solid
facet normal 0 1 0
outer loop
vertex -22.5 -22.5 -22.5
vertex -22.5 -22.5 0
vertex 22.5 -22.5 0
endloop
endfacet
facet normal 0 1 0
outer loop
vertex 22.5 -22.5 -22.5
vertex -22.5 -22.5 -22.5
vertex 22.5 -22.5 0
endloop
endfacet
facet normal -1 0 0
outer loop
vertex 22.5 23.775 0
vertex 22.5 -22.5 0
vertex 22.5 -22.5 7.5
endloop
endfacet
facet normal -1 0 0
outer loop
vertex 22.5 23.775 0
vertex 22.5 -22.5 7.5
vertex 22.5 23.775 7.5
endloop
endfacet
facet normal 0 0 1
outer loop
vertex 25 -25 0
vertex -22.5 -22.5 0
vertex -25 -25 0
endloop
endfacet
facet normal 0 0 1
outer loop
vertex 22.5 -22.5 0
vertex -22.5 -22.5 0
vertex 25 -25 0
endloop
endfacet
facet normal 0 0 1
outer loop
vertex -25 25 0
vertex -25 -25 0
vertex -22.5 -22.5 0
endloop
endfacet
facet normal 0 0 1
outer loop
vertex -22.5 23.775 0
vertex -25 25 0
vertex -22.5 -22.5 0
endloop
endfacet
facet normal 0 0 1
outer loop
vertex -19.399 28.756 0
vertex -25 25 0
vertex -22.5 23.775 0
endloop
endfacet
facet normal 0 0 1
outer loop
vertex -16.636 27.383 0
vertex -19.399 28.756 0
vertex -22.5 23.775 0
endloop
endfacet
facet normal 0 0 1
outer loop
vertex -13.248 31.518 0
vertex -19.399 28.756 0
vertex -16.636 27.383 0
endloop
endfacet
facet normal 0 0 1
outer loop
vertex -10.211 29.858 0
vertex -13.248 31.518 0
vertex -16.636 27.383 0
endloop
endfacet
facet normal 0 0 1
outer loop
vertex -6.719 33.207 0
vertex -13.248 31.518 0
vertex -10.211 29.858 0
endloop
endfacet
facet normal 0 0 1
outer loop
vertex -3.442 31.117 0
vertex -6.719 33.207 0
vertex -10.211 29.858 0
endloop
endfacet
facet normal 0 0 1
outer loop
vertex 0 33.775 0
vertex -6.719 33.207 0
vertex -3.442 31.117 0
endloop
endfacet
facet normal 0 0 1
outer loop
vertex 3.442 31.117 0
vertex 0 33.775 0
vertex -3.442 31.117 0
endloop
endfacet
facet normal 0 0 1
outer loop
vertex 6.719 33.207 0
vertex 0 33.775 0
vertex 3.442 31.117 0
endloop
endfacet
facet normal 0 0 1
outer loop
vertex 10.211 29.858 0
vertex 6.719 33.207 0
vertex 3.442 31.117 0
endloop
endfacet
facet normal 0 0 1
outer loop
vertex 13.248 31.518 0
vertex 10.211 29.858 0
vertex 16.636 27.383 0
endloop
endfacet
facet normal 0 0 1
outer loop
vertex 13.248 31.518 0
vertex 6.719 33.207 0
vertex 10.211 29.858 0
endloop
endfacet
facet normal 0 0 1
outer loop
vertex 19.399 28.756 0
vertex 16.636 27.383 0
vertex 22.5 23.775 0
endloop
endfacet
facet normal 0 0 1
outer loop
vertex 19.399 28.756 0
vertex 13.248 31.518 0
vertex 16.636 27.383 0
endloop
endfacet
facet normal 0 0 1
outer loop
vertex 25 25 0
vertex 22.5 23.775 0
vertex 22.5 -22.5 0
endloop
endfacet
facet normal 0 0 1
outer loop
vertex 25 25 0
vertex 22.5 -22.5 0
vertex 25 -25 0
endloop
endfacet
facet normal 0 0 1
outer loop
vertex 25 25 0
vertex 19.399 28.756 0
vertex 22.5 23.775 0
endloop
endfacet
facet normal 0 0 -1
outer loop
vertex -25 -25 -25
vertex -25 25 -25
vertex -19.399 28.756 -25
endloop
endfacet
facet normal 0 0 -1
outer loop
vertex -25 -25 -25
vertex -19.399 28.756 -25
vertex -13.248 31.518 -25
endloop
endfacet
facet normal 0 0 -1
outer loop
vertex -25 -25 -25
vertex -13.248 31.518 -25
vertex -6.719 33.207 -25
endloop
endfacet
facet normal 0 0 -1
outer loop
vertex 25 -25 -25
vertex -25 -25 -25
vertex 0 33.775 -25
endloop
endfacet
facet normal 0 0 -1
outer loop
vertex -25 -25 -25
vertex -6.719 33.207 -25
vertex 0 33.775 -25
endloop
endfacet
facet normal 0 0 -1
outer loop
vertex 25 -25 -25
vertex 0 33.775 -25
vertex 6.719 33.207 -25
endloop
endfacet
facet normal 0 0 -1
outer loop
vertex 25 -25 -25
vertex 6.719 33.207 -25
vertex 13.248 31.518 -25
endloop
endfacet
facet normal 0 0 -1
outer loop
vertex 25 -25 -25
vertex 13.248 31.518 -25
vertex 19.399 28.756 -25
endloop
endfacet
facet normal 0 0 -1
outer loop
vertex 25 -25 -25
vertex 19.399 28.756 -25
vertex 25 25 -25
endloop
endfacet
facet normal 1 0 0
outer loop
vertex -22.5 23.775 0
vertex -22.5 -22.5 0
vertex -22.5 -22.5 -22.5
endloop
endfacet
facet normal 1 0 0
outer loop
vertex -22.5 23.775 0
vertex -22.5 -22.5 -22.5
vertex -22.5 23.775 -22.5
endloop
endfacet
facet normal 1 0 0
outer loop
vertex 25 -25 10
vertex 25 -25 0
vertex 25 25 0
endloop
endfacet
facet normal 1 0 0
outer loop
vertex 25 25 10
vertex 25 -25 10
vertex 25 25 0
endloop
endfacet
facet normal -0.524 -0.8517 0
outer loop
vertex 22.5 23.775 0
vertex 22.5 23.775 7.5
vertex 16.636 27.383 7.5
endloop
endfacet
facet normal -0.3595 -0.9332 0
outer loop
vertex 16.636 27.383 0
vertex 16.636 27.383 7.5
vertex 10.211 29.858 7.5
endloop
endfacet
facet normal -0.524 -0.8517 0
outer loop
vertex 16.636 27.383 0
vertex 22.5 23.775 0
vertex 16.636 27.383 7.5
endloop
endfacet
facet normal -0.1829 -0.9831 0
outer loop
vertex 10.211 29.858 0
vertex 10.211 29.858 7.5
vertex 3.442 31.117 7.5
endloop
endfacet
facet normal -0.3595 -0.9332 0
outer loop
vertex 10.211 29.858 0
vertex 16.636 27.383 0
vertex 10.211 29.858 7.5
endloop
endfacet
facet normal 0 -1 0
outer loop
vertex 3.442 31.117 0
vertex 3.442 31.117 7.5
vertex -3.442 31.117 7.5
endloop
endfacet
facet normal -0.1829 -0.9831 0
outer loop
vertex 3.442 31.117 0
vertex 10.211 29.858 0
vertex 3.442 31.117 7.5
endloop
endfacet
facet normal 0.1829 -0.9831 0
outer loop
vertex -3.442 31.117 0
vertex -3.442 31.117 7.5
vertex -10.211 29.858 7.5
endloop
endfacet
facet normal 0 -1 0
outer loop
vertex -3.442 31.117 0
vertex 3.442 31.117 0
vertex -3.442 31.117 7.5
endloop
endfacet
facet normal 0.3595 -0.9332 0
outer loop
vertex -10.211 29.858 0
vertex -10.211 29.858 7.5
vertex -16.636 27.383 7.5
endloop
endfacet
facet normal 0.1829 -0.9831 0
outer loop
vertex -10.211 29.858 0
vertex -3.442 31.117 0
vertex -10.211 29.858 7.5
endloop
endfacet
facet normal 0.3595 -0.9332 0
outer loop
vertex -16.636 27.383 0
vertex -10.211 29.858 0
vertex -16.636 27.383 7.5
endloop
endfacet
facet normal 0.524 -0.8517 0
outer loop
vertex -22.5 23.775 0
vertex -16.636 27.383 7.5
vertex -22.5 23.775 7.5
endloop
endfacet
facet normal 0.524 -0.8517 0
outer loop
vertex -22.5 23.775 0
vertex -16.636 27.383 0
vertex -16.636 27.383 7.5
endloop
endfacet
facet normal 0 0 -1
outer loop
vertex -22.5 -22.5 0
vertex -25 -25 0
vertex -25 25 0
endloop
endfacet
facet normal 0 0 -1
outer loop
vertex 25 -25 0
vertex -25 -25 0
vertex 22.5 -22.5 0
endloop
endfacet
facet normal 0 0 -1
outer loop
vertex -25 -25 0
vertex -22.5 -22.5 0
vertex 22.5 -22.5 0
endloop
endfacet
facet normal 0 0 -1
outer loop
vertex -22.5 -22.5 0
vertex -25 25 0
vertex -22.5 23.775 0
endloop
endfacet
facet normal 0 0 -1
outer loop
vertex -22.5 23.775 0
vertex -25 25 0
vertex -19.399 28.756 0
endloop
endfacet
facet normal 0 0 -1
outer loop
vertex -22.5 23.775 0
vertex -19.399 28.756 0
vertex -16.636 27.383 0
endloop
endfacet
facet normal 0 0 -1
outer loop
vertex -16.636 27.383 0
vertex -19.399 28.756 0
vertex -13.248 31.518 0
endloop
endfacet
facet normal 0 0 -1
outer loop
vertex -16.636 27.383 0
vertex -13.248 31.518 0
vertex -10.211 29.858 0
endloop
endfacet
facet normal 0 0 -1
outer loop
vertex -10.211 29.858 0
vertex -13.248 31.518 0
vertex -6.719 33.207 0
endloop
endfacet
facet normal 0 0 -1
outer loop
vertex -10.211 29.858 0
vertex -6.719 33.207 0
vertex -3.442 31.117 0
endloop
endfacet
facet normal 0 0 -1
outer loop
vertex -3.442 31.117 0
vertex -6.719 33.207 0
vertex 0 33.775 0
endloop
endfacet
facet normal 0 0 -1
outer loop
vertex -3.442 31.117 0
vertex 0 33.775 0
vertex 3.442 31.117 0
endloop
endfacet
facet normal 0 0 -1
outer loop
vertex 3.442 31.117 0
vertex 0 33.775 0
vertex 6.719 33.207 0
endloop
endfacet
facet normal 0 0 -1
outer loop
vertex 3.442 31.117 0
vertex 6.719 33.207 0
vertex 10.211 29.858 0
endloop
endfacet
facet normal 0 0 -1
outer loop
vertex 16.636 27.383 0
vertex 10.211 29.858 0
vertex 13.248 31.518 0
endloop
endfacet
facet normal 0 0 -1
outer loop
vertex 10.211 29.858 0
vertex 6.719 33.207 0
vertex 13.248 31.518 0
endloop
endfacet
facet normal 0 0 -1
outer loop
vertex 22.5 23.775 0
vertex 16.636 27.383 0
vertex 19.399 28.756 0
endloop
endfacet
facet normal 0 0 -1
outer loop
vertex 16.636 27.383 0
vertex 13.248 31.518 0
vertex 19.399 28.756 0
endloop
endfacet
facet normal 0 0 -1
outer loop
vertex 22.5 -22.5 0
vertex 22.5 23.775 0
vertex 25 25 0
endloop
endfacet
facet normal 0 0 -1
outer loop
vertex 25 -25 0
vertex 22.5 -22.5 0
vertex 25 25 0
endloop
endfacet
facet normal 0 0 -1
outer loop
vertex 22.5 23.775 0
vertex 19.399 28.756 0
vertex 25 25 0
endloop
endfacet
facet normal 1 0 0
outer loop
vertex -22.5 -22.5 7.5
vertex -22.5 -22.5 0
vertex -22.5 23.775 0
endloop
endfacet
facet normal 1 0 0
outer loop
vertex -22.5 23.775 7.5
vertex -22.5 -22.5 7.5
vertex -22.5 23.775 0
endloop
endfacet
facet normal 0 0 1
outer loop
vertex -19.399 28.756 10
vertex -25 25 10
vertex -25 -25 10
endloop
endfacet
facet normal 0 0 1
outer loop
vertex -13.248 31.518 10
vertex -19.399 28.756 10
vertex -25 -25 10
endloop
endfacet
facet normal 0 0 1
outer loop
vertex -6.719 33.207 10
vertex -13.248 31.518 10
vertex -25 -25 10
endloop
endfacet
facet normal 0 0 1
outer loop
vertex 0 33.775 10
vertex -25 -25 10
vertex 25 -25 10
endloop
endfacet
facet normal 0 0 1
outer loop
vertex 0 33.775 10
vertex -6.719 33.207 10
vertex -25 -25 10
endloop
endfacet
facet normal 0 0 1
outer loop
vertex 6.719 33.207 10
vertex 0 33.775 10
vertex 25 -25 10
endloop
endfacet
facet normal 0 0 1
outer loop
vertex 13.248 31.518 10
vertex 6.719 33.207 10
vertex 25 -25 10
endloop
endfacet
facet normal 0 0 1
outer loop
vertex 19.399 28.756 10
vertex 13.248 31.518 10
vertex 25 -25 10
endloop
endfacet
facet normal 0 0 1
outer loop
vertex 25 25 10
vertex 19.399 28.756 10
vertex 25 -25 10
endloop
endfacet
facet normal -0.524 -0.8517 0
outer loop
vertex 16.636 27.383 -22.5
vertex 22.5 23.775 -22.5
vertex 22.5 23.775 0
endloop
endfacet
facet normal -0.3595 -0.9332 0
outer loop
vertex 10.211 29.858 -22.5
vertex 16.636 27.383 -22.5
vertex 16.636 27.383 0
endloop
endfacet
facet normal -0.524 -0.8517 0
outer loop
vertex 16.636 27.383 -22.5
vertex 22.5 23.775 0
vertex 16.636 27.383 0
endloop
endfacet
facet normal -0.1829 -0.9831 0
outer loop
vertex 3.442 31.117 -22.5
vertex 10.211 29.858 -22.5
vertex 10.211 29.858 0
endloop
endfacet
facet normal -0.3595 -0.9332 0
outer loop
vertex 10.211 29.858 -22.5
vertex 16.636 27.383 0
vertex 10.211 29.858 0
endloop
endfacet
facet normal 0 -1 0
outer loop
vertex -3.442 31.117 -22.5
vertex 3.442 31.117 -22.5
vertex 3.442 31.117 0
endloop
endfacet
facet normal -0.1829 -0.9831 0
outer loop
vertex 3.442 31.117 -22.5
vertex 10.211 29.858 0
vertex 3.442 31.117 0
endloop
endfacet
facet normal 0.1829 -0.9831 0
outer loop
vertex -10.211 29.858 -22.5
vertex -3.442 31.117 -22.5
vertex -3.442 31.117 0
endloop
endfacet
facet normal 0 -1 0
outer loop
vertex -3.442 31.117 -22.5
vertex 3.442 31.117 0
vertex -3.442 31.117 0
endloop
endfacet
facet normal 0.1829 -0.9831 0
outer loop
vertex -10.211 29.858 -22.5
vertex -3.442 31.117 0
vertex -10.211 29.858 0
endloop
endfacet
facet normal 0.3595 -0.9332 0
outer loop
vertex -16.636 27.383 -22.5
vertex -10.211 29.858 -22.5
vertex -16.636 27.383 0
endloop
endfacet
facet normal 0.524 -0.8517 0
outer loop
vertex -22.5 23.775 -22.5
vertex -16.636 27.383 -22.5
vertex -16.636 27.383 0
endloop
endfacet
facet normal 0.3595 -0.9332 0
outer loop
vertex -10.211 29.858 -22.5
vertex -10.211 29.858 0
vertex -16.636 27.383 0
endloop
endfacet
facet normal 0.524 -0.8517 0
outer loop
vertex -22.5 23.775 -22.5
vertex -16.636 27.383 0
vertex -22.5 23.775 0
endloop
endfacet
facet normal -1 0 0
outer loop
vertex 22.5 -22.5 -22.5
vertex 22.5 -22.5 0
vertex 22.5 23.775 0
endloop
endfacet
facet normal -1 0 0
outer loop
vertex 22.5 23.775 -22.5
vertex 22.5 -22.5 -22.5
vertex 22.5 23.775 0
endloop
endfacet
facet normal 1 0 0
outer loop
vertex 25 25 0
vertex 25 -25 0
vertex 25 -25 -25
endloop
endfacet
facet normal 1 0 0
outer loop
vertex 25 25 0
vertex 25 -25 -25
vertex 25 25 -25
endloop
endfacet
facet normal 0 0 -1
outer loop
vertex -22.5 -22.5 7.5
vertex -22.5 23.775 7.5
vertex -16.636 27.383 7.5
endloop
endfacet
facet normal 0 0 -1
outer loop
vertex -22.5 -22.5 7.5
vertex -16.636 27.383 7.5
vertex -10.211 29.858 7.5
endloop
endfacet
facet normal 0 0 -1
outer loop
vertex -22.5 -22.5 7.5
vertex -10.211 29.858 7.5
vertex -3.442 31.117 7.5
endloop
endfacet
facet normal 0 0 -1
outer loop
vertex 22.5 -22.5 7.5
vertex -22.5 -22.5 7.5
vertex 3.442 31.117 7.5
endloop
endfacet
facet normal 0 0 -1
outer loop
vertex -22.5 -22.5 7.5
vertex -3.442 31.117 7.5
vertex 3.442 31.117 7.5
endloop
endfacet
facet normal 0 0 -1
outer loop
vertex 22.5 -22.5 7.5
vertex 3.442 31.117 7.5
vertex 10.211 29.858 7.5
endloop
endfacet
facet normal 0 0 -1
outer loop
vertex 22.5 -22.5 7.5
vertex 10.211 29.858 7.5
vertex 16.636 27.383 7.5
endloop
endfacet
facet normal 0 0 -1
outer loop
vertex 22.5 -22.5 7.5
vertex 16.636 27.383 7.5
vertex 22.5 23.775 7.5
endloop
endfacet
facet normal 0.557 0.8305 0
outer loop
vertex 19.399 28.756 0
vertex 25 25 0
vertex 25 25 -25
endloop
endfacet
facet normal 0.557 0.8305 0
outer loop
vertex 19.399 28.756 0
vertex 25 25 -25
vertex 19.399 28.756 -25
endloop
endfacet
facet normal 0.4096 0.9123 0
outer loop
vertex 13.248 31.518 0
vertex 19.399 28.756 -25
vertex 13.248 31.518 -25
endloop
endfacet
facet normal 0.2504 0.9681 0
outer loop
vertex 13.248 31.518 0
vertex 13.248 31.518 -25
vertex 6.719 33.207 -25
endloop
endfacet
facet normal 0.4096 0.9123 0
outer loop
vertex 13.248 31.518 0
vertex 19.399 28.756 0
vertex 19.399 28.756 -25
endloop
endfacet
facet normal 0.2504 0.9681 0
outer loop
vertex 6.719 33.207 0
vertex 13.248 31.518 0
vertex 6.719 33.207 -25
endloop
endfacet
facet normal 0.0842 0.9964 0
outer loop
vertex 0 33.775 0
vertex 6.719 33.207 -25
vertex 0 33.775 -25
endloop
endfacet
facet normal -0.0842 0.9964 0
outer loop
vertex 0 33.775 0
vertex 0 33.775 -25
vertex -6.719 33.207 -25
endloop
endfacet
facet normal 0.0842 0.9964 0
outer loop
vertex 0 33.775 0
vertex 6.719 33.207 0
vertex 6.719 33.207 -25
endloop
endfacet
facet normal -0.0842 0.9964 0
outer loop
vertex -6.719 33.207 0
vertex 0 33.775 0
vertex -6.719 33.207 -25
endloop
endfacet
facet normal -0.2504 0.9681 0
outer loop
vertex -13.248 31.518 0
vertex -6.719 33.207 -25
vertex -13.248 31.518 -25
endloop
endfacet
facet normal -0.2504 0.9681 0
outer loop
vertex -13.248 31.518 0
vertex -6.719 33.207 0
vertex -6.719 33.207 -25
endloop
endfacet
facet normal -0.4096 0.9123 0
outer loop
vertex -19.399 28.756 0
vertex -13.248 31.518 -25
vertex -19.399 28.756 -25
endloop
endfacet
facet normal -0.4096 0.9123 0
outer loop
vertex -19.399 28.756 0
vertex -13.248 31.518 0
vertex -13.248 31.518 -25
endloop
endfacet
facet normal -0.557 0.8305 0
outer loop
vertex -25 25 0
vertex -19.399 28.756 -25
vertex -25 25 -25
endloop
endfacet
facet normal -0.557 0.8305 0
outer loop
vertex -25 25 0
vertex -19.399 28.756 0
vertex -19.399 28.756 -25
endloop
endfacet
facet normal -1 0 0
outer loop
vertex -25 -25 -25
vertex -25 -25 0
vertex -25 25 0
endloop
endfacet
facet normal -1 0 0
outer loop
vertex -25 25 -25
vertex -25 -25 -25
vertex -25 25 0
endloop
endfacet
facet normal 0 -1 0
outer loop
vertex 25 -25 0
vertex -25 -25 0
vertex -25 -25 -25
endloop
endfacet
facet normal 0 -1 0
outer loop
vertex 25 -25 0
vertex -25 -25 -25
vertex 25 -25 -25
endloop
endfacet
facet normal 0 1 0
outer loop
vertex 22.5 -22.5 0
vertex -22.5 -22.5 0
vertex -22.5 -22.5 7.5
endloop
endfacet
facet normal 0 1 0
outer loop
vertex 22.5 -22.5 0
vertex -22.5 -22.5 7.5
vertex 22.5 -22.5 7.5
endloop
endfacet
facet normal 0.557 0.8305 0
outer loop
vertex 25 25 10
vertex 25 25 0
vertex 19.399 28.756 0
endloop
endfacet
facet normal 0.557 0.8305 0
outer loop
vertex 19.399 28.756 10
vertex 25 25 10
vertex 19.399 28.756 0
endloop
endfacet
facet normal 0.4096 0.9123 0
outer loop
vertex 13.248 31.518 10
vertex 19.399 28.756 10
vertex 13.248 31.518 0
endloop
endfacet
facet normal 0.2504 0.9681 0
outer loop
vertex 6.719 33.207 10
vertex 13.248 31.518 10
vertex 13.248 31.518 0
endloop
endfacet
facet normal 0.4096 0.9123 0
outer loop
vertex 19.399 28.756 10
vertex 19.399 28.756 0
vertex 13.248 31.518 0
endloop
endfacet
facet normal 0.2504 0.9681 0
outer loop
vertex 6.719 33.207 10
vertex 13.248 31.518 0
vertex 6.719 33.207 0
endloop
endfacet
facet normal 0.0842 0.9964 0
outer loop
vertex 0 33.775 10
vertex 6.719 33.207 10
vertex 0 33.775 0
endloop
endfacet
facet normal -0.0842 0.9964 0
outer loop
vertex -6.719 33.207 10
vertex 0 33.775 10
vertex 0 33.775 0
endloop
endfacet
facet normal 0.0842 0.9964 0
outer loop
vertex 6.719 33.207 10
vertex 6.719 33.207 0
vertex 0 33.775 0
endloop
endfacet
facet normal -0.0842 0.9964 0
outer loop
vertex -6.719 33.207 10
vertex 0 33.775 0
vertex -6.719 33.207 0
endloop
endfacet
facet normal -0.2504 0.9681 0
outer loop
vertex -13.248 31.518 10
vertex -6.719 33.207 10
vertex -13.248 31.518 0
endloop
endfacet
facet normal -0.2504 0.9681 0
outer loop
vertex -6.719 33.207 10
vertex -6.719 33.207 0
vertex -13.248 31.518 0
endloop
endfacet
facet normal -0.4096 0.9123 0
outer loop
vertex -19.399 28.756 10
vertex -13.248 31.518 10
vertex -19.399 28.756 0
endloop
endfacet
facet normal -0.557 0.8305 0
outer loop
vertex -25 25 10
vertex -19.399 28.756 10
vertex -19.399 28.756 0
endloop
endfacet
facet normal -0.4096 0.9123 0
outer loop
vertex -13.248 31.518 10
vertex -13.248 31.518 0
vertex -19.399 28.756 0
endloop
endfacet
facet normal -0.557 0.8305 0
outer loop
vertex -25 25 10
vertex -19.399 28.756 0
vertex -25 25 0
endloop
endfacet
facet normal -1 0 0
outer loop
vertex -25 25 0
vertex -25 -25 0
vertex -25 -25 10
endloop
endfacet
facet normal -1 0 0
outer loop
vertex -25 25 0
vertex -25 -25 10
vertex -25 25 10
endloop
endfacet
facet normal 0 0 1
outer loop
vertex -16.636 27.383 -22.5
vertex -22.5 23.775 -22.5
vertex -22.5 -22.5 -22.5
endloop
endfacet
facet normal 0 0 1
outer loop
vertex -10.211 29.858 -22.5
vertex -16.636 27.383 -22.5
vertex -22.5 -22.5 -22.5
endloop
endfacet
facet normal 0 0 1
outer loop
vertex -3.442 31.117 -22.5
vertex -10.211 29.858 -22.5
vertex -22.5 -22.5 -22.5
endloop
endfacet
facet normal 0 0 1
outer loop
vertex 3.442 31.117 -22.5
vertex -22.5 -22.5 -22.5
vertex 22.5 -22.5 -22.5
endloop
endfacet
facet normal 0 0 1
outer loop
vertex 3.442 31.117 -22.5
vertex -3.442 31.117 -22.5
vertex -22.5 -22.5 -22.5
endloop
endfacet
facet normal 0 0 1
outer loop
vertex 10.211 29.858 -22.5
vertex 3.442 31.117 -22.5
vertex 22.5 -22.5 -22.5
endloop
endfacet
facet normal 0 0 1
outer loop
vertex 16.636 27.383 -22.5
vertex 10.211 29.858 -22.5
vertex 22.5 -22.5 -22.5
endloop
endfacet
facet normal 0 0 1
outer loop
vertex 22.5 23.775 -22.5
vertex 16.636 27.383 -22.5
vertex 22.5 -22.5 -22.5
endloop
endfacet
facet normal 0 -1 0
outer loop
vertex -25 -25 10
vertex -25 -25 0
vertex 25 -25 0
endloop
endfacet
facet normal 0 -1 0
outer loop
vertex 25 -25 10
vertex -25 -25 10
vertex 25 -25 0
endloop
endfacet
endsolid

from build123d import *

# Parameters (mm, degrees)
F0_W     = 50
F0_H     = 50
F1_DEPTH = 25
F2_DEPTH = 10
F3_T     = -2.5
F3_2_T   = -2.5


with BuildPart() as f1:
    # F0 (on Top) → F1 (new body)
    with BuildSketch(Plane.XY):
        Rectangle(F0_W, F0_H)
        with BuildLine():
            ThreePointArc((25, 25), (0, 33.775010008), (-25, 25))
            Line((-25, 25), (25, 25))
        make_face()
    extrude(amount=-F1_DEPTH)

    # F3
    f3_openings = [f1.faces().sort_by_distance(p)[0] for p in [
        (0, 3.054648, 0),
    ]]
    offset(amount=F3_T, openings=f3_openings)


with BuildPart() as f2:
    # F0 (on Top) → F2 (new body)
    with BuildSketch(Plane.XY):
        with BuildLine():
            ThreePointArc((25, 25), (0, 33.775010008), (-25, 25))
            Line((-25, 25), (25, 25))
        make_face()
        Rectangle(F0_W, F0_H)
    extrude(amount=F2_DEPTH)

    # F3#2
    f3_2_openings = [f2.faces().sort_by_distance(p)[0] for p in [
        (0, 3.054648, 0),
    ]]
    offset(amount=F3_2_T, openings=f3_2_openings)


solid = Compound([f1.part, f2.part])
